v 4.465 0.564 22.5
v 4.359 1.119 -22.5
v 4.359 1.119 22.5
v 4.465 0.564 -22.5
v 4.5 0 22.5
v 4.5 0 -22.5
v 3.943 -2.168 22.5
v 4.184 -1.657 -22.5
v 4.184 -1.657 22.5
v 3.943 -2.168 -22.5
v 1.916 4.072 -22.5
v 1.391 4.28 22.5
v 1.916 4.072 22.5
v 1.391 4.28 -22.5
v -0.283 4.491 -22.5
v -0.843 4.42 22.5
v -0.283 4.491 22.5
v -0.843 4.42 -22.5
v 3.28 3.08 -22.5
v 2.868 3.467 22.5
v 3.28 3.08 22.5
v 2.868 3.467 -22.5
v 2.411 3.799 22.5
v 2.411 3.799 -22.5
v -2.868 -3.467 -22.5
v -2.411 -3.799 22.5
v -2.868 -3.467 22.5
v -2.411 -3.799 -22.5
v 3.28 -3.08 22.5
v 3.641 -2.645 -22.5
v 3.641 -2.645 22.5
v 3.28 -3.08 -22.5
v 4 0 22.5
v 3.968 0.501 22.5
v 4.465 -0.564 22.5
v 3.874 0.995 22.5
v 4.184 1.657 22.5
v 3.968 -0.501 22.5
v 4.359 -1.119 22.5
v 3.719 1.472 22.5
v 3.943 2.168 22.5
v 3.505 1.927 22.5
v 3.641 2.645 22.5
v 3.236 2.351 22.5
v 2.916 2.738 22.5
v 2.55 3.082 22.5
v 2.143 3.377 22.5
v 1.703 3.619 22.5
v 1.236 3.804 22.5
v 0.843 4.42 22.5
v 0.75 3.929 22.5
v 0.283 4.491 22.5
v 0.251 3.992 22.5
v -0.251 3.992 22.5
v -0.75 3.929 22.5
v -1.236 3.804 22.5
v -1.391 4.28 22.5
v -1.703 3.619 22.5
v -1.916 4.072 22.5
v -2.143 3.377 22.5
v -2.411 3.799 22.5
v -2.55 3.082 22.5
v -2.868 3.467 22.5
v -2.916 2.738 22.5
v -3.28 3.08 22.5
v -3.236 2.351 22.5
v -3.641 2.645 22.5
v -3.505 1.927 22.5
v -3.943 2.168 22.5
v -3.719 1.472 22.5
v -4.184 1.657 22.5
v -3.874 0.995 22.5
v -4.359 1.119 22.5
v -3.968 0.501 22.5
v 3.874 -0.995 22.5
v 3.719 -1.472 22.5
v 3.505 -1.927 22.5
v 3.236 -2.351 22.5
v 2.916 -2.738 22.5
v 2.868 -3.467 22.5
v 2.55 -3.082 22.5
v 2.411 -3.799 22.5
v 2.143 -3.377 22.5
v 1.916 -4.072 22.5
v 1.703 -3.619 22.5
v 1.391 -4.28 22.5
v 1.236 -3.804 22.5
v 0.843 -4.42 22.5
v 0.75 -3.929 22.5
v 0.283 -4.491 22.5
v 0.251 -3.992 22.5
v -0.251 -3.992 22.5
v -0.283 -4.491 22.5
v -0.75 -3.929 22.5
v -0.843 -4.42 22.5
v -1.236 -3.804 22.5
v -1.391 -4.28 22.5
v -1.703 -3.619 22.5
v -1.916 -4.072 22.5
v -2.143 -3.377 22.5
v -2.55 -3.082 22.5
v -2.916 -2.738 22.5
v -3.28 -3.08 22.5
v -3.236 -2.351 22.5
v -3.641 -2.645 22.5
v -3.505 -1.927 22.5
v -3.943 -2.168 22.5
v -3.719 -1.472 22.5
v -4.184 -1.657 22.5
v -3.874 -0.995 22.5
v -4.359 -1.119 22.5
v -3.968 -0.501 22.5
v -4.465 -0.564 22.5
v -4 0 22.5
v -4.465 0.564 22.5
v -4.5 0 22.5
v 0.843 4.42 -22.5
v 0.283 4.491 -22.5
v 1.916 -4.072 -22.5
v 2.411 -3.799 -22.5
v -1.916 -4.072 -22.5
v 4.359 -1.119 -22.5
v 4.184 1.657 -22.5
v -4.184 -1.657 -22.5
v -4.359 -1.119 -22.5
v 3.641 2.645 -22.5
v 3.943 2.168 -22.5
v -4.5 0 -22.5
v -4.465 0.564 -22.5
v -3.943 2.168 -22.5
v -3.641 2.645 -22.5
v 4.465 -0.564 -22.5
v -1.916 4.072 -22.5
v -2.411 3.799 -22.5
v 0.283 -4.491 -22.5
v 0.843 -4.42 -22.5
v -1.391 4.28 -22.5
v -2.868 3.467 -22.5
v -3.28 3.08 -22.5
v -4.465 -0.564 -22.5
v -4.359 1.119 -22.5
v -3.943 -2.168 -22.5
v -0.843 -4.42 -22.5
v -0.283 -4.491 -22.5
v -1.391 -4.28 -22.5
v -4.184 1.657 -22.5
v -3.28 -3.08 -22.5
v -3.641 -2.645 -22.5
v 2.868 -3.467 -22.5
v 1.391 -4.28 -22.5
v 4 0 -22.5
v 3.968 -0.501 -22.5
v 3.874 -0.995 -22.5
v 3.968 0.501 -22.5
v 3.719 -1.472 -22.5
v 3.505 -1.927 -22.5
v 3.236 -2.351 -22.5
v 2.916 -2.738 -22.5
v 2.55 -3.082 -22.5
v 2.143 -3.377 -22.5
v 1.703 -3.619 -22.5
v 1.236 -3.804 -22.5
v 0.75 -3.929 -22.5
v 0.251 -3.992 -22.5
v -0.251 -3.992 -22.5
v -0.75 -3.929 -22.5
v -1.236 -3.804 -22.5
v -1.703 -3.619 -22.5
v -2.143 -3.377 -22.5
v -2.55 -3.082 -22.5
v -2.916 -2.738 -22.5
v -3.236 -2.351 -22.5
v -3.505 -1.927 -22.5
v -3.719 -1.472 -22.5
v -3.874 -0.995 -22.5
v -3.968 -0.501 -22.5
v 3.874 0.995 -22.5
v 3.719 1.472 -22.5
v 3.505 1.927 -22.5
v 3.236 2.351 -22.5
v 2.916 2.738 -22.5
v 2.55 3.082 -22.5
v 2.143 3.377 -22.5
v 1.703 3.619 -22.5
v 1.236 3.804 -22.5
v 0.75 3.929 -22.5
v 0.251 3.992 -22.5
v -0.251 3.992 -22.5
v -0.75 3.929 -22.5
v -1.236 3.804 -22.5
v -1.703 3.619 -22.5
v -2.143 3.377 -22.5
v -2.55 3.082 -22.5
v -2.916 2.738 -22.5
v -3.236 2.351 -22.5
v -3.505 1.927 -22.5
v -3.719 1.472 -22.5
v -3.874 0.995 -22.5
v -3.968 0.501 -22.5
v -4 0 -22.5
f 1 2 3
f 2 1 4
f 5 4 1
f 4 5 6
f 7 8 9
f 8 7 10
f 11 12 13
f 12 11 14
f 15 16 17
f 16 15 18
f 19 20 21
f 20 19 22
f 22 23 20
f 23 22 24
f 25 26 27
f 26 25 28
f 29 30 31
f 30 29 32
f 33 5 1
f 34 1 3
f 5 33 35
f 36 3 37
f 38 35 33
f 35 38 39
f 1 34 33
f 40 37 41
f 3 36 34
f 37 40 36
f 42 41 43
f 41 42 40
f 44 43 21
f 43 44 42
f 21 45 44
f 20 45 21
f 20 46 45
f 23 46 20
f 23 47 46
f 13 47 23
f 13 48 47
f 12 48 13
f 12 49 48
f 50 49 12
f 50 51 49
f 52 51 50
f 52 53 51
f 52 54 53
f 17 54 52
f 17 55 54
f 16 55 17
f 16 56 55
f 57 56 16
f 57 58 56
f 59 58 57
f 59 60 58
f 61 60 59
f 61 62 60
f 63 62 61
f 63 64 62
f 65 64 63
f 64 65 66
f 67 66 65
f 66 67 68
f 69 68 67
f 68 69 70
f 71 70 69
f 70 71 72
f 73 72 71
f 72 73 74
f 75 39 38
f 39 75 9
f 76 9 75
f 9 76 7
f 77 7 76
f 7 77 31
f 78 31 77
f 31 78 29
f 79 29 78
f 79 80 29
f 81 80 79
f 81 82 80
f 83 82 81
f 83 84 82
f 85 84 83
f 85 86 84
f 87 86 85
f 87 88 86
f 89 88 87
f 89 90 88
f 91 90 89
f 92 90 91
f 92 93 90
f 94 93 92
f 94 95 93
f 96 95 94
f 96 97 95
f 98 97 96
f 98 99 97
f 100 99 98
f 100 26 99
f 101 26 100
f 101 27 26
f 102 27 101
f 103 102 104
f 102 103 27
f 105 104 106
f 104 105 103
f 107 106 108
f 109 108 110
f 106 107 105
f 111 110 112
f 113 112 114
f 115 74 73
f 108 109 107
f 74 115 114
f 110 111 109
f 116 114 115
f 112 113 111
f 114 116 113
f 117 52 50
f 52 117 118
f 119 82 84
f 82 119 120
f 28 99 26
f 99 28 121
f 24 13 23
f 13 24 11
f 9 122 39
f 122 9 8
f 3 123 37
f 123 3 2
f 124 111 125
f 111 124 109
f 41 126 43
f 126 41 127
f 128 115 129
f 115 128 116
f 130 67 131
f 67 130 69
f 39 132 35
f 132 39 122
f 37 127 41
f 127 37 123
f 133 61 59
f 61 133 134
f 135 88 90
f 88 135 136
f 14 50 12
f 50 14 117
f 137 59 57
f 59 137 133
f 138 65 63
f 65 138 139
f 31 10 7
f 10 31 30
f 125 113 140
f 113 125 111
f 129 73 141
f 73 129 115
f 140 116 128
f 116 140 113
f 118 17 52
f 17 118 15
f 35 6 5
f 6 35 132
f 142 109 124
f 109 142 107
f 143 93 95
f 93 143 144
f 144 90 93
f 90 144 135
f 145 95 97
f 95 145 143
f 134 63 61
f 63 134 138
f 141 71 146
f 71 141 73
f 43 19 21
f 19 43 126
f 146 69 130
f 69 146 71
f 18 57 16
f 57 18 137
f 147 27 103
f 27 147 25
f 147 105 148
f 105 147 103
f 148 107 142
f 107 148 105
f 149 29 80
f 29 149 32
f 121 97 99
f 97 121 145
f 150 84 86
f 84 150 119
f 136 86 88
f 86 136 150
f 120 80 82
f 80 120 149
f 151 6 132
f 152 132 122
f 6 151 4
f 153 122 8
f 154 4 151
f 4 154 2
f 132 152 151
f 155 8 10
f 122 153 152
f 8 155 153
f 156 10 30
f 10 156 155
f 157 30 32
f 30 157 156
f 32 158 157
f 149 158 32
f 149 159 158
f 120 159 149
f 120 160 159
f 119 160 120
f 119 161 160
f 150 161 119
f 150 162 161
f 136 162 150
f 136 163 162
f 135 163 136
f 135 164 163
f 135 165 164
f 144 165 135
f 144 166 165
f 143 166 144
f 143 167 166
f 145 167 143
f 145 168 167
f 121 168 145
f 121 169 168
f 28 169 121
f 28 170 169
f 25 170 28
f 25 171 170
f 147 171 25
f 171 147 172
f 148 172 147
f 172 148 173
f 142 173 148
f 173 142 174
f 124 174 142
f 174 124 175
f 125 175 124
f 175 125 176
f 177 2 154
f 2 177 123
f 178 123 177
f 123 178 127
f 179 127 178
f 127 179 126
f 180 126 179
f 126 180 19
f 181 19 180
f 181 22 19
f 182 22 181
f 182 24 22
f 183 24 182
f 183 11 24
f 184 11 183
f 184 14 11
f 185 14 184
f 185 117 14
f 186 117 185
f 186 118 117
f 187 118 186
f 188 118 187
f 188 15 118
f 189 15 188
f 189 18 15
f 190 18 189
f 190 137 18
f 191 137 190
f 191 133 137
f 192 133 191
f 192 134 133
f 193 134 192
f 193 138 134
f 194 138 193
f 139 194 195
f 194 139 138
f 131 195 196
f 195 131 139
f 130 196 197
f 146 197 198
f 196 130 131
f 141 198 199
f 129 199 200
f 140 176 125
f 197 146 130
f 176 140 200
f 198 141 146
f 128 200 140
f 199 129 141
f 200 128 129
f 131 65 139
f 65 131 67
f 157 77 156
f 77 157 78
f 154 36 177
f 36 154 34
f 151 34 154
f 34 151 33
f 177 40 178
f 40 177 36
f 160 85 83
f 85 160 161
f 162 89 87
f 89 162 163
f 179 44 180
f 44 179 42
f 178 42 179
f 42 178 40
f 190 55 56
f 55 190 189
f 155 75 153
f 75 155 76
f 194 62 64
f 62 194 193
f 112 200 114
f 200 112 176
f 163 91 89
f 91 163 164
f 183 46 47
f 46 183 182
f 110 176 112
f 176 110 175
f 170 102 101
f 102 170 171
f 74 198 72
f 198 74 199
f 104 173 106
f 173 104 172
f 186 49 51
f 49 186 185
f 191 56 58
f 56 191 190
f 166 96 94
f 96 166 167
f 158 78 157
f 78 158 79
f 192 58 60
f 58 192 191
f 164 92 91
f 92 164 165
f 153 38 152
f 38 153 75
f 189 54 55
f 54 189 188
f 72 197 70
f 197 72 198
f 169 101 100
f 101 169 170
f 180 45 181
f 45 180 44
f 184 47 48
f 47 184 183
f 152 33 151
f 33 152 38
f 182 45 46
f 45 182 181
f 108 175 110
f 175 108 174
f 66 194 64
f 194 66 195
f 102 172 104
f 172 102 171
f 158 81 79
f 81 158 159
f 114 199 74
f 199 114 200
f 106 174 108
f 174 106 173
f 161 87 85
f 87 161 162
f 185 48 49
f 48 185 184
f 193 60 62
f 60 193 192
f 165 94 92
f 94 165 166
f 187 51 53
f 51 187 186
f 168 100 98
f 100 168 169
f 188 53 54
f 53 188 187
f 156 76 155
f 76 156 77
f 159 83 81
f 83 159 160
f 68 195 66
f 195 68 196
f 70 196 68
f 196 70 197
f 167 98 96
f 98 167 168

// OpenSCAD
$fn = 50;


difference() {
	union() {
		translate(v = [0, 0, -22.5000000000]) {
			cylinder(h = 45, r = 4.5000000000);
		}
	}
	union() {
		translate(v = [0, 0, -100.0000000000]) {
			cylinder(h = 200, r = 4.0000000000);
		}
	}
}
